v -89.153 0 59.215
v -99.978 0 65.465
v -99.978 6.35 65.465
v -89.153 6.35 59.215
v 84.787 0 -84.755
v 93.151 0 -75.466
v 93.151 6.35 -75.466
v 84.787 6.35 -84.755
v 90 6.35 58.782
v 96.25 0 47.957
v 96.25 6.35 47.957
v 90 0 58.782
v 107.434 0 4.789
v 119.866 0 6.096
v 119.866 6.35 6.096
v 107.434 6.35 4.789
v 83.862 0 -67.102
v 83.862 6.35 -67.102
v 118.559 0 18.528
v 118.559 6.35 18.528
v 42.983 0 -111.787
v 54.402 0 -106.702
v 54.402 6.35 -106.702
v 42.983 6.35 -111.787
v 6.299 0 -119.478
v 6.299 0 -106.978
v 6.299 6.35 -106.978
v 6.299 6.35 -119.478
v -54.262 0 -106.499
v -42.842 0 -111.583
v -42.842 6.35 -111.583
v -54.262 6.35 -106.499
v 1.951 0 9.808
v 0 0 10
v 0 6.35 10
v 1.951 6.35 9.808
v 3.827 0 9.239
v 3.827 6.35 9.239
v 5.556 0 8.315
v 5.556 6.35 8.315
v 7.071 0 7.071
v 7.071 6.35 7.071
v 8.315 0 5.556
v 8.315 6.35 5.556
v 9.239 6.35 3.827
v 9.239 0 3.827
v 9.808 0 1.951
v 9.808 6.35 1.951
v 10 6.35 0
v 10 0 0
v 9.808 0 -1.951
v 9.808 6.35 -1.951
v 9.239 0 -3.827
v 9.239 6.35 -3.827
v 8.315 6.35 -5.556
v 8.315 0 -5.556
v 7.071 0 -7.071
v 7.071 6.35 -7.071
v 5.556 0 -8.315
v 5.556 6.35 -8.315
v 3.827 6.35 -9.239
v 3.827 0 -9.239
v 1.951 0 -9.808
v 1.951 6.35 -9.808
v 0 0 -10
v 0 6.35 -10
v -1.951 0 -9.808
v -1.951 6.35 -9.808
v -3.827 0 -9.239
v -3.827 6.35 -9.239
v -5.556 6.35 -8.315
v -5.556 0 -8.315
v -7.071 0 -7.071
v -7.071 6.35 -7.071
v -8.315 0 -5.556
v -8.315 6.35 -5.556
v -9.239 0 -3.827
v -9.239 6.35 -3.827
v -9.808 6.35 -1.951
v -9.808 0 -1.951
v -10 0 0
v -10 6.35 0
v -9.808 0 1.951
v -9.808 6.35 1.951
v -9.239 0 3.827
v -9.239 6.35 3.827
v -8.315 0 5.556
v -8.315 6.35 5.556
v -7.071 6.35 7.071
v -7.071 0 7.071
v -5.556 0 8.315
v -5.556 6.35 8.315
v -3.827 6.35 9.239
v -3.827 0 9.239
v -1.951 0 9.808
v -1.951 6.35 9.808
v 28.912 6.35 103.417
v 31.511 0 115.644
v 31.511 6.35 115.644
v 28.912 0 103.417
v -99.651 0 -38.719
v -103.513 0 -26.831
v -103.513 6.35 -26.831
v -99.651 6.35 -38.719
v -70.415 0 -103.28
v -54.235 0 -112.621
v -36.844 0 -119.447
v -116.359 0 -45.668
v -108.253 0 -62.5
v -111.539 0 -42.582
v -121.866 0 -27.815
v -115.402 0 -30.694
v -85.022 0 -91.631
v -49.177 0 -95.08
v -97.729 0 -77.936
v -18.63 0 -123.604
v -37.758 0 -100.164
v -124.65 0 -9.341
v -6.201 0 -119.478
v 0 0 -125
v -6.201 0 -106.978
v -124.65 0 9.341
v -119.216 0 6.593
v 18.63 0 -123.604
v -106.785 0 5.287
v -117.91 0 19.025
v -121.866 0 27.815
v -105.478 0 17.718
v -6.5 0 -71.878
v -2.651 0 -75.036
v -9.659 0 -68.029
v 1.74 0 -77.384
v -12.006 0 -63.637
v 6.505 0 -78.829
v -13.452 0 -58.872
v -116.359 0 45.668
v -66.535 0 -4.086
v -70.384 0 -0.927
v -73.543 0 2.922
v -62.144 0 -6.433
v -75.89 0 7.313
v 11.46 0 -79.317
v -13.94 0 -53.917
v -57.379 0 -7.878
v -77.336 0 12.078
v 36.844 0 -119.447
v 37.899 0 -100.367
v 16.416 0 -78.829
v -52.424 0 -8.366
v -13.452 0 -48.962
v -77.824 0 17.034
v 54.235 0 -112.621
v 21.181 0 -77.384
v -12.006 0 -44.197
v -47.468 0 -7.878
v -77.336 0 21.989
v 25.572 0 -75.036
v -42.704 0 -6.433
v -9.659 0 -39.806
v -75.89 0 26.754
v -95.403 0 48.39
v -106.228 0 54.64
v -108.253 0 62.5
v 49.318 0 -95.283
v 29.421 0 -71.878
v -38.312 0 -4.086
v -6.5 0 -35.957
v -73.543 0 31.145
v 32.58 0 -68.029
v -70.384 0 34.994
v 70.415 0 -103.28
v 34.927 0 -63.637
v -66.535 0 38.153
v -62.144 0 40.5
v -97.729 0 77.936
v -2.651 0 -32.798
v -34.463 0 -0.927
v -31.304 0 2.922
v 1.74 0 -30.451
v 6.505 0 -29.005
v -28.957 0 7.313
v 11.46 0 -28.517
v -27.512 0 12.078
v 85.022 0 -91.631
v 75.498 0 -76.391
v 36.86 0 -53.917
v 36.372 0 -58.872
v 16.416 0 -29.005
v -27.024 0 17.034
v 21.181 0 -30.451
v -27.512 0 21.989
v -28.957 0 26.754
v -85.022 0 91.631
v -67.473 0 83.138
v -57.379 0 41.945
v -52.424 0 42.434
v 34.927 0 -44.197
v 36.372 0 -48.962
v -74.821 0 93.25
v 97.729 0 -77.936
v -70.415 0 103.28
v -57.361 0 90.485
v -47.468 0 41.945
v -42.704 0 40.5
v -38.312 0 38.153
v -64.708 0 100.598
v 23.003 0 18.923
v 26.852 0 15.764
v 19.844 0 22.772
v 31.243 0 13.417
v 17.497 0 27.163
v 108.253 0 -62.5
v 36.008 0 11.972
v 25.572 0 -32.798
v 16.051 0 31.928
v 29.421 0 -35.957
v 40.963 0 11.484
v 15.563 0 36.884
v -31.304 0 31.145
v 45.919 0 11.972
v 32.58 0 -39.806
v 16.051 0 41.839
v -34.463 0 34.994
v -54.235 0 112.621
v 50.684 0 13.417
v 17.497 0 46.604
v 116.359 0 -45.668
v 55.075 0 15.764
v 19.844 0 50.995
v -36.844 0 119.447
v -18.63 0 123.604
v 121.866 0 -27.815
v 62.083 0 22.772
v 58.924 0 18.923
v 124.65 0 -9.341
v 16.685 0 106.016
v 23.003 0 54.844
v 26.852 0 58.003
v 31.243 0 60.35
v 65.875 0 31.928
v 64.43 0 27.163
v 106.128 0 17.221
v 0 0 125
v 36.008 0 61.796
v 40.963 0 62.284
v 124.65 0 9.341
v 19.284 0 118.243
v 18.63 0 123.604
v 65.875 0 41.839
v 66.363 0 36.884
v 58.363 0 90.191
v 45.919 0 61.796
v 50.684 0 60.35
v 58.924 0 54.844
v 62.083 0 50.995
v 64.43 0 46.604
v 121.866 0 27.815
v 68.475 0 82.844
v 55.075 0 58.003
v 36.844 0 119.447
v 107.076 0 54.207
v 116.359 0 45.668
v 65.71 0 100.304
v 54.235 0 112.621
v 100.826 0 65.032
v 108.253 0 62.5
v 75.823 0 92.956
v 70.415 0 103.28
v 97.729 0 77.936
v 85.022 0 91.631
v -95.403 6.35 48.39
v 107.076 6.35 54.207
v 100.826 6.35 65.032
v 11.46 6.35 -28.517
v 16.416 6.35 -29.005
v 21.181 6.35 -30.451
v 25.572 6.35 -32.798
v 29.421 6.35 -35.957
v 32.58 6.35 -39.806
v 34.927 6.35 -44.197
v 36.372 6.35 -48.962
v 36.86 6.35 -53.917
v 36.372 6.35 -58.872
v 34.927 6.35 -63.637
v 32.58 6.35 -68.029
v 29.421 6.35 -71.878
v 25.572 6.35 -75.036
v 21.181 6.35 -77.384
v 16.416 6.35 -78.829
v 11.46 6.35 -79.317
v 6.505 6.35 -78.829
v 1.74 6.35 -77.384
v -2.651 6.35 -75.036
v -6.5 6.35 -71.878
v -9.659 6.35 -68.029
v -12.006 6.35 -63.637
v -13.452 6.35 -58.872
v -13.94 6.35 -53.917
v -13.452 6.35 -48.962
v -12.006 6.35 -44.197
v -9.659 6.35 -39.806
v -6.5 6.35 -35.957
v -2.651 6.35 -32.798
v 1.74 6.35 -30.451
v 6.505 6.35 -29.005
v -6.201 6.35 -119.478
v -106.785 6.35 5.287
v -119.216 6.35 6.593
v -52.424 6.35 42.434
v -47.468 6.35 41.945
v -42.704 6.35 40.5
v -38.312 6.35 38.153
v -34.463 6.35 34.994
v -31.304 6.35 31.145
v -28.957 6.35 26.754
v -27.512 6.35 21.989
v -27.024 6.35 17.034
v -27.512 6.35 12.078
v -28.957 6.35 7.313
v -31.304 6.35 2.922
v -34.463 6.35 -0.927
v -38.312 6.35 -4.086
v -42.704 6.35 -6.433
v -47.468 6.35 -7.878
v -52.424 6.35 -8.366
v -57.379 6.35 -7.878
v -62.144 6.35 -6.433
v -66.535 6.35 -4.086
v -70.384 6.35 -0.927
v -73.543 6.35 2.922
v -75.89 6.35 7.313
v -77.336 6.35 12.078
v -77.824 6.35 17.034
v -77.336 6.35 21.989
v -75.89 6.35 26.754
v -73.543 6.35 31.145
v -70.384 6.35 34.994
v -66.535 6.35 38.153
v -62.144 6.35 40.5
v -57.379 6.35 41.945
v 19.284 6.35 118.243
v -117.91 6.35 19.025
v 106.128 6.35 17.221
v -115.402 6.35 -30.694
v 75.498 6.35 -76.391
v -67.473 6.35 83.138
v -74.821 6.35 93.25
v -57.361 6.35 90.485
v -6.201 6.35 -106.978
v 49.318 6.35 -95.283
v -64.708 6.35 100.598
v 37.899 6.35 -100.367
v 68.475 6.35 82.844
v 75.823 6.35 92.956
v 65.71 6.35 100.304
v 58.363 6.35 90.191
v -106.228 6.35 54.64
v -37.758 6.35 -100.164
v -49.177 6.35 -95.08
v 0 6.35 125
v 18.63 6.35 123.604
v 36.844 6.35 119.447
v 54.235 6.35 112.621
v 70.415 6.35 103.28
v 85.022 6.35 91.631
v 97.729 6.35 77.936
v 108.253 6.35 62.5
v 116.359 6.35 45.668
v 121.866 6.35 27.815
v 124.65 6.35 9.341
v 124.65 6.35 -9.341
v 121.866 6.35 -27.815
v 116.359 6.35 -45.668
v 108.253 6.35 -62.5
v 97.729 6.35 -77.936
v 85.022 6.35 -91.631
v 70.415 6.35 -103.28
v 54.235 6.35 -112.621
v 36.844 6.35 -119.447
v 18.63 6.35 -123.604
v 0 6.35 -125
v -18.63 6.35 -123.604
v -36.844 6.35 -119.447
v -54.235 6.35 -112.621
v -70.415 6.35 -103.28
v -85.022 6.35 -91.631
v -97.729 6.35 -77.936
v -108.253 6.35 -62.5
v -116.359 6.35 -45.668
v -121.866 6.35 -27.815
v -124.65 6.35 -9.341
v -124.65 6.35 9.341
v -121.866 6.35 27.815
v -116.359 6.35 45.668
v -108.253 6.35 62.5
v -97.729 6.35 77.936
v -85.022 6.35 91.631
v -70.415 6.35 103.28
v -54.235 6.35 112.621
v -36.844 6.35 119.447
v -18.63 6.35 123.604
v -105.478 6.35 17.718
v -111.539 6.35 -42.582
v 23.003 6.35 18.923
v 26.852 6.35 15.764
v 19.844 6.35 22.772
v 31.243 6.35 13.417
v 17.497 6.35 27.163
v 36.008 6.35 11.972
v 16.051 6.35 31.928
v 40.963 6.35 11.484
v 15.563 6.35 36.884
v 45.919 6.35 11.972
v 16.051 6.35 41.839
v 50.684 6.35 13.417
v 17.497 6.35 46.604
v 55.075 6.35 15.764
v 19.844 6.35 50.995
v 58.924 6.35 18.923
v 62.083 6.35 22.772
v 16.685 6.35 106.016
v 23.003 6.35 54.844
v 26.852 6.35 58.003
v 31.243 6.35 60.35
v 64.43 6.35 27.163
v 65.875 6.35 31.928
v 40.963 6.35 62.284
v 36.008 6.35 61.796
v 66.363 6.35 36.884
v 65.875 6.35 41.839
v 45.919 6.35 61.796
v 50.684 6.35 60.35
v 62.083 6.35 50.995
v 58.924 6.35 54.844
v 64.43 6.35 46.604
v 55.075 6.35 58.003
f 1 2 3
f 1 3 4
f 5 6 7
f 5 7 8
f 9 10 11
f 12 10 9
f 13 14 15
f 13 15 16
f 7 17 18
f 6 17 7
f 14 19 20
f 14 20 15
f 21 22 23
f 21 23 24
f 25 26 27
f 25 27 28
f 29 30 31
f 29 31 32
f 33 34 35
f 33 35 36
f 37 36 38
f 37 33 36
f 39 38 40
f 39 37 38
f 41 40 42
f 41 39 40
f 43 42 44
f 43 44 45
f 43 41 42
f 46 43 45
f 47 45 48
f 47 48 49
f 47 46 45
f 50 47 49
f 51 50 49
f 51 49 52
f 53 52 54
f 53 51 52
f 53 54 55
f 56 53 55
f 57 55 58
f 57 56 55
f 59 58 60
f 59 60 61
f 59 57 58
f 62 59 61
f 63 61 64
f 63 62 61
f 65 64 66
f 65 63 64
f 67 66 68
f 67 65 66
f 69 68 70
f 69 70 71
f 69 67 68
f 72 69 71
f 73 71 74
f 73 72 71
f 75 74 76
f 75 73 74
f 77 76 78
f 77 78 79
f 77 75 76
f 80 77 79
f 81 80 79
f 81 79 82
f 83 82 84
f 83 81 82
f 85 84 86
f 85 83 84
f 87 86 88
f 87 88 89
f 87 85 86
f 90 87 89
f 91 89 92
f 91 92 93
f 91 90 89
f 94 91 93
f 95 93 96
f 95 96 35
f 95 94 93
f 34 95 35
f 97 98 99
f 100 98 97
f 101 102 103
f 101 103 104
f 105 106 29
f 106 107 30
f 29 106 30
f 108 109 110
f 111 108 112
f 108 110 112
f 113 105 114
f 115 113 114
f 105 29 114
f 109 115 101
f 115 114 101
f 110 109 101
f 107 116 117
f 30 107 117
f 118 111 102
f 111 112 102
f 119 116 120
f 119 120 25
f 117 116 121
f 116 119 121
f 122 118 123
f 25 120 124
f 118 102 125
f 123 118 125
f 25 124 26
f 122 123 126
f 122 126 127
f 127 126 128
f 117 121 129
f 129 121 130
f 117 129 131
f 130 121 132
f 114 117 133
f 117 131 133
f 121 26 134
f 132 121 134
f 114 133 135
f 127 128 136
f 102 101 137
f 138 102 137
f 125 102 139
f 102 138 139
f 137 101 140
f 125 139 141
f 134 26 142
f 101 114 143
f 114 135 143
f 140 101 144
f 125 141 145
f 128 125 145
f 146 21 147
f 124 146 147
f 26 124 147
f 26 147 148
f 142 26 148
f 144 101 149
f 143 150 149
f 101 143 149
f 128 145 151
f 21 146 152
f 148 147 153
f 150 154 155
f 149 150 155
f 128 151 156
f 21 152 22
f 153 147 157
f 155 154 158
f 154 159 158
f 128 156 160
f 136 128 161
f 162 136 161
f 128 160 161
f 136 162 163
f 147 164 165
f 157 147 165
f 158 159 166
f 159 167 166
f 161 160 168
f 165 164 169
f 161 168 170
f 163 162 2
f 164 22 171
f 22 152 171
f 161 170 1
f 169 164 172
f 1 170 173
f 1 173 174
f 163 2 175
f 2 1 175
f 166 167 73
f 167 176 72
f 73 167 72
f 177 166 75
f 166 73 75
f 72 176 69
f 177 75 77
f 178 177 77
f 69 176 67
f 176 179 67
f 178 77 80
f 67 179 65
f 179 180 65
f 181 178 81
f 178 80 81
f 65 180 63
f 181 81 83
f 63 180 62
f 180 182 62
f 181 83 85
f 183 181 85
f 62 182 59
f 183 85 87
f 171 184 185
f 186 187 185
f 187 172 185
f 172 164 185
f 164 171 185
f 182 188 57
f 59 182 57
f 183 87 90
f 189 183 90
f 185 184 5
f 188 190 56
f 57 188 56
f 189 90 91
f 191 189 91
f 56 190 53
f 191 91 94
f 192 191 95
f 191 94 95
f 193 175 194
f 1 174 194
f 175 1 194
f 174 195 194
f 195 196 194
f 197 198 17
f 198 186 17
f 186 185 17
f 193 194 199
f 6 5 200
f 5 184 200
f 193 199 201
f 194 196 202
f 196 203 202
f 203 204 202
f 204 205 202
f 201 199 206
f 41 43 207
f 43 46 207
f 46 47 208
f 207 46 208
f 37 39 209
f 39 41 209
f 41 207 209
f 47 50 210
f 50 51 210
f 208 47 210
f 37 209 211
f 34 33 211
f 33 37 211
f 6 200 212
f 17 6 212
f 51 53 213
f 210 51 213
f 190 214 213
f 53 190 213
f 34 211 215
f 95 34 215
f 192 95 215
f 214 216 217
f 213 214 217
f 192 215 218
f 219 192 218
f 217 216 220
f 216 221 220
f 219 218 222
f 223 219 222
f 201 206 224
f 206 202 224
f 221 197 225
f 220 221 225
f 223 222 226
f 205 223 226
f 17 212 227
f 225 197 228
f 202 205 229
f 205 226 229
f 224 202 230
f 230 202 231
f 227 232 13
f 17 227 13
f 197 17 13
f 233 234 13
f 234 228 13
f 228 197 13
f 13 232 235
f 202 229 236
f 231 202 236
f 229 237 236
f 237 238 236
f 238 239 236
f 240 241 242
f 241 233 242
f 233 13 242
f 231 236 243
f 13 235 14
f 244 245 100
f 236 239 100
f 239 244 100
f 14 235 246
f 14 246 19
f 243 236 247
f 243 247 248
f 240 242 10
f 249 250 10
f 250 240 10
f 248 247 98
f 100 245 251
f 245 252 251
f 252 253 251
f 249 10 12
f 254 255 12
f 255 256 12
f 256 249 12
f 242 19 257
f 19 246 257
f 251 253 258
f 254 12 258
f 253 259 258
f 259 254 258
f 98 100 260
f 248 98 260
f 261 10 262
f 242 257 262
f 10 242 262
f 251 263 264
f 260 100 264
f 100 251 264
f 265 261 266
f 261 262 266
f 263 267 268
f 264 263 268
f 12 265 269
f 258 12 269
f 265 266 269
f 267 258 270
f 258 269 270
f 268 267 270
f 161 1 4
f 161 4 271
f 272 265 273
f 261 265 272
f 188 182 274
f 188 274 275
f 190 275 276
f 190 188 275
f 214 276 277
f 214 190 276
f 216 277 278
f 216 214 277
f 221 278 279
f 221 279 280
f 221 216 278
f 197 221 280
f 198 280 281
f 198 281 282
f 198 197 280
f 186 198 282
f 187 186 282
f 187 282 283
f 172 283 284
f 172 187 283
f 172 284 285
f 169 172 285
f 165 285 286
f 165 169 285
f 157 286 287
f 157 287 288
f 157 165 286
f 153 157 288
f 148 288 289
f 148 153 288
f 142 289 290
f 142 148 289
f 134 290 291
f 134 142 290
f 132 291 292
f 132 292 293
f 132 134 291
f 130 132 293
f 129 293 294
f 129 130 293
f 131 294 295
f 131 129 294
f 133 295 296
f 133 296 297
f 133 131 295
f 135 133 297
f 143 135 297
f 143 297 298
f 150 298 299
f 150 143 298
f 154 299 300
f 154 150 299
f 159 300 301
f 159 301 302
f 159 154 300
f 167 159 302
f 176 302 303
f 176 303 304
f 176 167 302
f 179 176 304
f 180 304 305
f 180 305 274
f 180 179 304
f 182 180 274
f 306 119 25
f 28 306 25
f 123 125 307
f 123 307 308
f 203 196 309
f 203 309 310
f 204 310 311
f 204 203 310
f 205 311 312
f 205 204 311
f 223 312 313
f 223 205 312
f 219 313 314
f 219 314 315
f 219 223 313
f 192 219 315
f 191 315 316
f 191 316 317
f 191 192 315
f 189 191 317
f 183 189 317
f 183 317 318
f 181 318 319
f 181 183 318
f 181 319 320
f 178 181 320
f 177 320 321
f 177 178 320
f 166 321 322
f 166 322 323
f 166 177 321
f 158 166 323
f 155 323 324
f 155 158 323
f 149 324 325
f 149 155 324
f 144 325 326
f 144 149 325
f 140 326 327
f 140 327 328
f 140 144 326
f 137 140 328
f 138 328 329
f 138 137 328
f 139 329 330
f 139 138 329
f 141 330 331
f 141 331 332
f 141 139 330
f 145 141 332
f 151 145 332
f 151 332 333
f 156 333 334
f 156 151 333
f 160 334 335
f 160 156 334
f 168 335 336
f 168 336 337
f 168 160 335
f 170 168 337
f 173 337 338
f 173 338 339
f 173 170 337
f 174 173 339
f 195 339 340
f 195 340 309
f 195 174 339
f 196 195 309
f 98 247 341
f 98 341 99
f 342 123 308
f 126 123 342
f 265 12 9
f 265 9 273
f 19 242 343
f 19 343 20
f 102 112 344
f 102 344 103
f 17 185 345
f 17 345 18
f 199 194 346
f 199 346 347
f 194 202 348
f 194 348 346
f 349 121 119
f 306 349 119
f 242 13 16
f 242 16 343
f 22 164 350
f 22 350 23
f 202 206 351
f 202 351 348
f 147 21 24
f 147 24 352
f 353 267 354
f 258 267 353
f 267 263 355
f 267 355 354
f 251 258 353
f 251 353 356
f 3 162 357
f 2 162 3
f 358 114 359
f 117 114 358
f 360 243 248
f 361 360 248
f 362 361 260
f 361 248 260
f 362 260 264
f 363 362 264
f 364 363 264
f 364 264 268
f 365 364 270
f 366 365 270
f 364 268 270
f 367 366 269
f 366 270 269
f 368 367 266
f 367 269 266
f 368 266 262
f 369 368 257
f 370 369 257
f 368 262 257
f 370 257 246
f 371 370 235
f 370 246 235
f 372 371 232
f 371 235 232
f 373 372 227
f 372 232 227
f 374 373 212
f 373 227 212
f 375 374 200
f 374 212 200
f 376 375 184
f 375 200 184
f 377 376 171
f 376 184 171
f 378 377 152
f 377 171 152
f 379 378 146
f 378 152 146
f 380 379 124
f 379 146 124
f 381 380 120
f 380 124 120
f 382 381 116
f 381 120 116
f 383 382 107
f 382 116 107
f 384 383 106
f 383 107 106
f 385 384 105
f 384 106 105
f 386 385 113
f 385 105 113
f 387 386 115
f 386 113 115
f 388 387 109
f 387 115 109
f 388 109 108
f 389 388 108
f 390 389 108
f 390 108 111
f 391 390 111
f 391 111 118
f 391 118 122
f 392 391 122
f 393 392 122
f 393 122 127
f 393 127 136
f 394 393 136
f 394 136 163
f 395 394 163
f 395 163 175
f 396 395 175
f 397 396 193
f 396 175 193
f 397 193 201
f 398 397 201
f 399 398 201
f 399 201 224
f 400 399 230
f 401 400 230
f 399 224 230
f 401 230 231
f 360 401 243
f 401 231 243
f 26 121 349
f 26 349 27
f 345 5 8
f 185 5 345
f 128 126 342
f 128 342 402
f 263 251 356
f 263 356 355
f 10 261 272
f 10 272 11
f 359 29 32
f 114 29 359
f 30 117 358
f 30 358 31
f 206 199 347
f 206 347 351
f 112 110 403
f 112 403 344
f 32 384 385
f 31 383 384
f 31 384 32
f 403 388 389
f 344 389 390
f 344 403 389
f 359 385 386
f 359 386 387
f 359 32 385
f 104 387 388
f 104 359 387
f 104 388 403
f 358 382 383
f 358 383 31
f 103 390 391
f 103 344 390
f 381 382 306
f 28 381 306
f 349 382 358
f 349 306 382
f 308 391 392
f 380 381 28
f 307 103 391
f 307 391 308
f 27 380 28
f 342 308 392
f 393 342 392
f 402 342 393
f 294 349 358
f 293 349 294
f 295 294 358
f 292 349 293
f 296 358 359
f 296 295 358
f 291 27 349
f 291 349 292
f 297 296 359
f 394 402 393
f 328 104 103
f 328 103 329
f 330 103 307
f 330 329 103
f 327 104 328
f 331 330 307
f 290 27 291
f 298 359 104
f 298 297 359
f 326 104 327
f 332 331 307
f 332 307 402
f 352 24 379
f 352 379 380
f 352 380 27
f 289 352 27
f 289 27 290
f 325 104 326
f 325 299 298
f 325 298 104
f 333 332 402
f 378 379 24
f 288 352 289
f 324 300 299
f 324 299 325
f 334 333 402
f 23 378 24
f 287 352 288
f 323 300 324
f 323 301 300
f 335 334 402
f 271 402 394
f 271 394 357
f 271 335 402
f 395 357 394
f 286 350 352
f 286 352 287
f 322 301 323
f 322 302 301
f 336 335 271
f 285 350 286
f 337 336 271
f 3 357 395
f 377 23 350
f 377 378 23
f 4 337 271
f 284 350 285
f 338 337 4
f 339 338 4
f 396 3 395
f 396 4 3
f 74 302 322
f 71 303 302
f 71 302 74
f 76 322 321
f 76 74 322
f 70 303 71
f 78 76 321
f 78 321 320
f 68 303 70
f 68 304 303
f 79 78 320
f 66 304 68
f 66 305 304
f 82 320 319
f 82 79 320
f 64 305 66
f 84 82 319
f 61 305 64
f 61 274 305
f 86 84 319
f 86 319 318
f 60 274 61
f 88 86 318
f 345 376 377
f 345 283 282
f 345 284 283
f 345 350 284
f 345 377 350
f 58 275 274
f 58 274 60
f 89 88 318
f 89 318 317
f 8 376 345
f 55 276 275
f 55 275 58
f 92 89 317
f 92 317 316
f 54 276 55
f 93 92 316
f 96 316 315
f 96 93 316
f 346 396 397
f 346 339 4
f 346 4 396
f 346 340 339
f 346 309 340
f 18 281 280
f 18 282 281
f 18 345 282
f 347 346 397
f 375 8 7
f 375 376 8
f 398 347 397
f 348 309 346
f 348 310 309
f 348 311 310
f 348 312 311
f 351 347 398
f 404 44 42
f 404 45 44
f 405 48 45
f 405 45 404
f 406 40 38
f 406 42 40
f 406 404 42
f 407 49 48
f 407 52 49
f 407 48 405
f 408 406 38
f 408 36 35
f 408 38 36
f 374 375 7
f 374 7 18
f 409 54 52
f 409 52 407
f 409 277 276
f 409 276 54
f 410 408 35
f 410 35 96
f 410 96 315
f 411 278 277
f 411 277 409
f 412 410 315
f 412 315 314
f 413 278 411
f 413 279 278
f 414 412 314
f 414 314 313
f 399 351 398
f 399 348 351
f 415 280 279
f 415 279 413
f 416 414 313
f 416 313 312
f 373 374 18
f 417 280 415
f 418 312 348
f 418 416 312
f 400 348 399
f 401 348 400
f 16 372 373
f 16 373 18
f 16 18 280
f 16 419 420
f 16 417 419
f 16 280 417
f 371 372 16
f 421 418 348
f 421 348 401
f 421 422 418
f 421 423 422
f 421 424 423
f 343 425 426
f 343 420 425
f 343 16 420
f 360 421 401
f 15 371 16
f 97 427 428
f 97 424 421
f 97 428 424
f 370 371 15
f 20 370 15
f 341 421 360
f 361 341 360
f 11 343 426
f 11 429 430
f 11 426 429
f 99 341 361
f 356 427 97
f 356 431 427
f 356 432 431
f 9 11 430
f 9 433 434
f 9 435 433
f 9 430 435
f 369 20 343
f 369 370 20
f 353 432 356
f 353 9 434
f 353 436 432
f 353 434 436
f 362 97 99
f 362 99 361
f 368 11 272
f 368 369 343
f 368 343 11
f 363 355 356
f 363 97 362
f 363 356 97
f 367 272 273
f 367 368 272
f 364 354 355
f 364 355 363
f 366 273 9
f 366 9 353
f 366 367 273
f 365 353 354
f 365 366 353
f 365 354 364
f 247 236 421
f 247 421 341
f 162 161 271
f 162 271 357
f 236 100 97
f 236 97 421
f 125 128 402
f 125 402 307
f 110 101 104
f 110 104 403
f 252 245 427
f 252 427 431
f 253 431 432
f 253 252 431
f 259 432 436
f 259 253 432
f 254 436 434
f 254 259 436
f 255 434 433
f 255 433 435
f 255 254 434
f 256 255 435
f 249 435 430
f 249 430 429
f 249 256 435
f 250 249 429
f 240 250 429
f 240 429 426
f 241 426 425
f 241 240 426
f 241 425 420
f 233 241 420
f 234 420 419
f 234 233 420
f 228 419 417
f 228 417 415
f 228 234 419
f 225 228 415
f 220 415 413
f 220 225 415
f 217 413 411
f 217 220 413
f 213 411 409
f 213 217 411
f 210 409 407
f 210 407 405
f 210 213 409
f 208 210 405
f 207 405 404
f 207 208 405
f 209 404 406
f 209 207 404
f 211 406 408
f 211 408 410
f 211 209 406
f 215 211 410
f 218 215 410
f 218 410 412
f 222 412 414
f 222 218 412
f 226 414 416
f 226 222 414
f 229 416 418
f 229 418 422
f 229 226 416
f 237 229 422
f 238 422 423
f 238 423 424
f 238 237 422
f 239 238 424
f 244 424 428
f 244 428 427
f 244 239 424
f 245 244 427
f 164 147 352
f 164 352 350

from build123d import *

# Parameters (mm, degrees)
SKETCH1_R           = 125
SKETCH1_R_2         = 25.4
SKETCH1_R_3         = 10
SKETCH1_W           = 12.5
SKETCH1_H           = 12.5
BOSS_EXTRUDE1_DEPTH = 6.35


with BuildPart() as part:
    # Sketch1 → Boss-Extrude1 (new body)
    with BuildSketch(Plane(origin=(0, 0, 0), x_dir=(1, 0, 0), z_dir=(0, 1, 0))):
        with Locations(Location((0, 0, 0), (0, 0, 270))):
            Circle(SKETCH1_R)
        with Locations(Location((11.46043037, 53.917085788, 0), (0, 0, 270))):
            Circle(SKETCH1_R_2, mode=Mode.SUBTRACT)
        with Locations(Location((40.963350806, -36.883566733, 0), (0, 0, 270))):
            Circle(SKETCH1_R_2, mode=Mode.SUBTRACT)
        with Locations(Location((-52.423781176, -17.033519055, 0), (0, 0, 270))):
            Circle(SKETCH1_R_2, mode=Mode.SUBTRACT)
        with Locations(Location((0, 0, 0), (0, 0, 270))):
            Circle(SKETCH1_R_3, mode=Mode.SUBTRACT)
        Polygon((42.983091671, 111.786574462), (37.898883633, 100.367256242), (49.318201853, 95.283048203), (54.402409892, 106.702366424), align=None, mode=Mode.SUBTRACT)
        with Locations((0.048751666, 113.22779336)):
            Rectangle(SKETCH1_W, SKETCH1_H, mode=Mode.SUBTRACT)
        Polygon((84.786921515, 84.755223028), (75.497611197, 76.391090449), (83.861743776, 67.10178013), (93.151054095, 75.46591271), align=None, mode=Mode.SUBTRACT)
        Polygon((119.865992309, -6.096099115), (107.434468617, -4.789493325), (106.127862826, -17.221017017), (118.559386518, -18.527622808), align=None, mode=Mode.SUBTRACT)
        Polygon((107.075743235, -54.207050868), (96.250425688, -47.957050868), (90.000425688, -58.782368416), (100.825743235, -65.032368416), align=None, mode=Mode.SUBTRACT)
        Polygon((75.82278228, -92.956329333), (68.475466627, -82.843616903), (58.362754197, -90.190932557), (65.710069851, -100.303644987), align=None, mode=Mode.SUBTRACT)
        Polygon((31.511030318, -115.643832236), (28.912134183, -103.416987227), (16.685289174, -106.015883362), (19.284185309, -118.242728371), align=None, mode=Mode.SUBTRACT)
        Polygon((-64.708058023, -100.597537613), (-57.360742369, -90.484825183), (-67.473454799, -83.137509529), (-74.820770452, -93.250221959), align=None, mode=Mode.SUBTRACT)
        Polygon((-99.978239904, -65.465381118), (-89.152922357, -59.215381118), (-95.402922357, -48.39006357), (-106.228239904, -54.64006357), align=None, mode=Mode.SUBTRACT)
        Polygon((-117.909618955, -19.024883755), (-105.478095263, -17.718277964), (-106.784701054, -5.286754272), (-119.216224746, -6.593360063), align=None, mode=Mode.SUBTRACT)
        Polygon((-115.401696837, 30.693970582), (-103.513490383, 26.831258152), (-99.650777953, 38.719464606), (-111.538984407, 42.582177036), align=None, mode=Mode.SUBTRACT)
        Polygon((-54.26167929, 106.498998102), (-49.177471251, 95.079679882), (-37.758153031, 100.16388792), (-42.842361069, 111.583206141), align=None, mode=Mode.SUBTRACT)
    extrude(amount=BOSS_EXTRUDE1_DEPTH)


solid = part.part
